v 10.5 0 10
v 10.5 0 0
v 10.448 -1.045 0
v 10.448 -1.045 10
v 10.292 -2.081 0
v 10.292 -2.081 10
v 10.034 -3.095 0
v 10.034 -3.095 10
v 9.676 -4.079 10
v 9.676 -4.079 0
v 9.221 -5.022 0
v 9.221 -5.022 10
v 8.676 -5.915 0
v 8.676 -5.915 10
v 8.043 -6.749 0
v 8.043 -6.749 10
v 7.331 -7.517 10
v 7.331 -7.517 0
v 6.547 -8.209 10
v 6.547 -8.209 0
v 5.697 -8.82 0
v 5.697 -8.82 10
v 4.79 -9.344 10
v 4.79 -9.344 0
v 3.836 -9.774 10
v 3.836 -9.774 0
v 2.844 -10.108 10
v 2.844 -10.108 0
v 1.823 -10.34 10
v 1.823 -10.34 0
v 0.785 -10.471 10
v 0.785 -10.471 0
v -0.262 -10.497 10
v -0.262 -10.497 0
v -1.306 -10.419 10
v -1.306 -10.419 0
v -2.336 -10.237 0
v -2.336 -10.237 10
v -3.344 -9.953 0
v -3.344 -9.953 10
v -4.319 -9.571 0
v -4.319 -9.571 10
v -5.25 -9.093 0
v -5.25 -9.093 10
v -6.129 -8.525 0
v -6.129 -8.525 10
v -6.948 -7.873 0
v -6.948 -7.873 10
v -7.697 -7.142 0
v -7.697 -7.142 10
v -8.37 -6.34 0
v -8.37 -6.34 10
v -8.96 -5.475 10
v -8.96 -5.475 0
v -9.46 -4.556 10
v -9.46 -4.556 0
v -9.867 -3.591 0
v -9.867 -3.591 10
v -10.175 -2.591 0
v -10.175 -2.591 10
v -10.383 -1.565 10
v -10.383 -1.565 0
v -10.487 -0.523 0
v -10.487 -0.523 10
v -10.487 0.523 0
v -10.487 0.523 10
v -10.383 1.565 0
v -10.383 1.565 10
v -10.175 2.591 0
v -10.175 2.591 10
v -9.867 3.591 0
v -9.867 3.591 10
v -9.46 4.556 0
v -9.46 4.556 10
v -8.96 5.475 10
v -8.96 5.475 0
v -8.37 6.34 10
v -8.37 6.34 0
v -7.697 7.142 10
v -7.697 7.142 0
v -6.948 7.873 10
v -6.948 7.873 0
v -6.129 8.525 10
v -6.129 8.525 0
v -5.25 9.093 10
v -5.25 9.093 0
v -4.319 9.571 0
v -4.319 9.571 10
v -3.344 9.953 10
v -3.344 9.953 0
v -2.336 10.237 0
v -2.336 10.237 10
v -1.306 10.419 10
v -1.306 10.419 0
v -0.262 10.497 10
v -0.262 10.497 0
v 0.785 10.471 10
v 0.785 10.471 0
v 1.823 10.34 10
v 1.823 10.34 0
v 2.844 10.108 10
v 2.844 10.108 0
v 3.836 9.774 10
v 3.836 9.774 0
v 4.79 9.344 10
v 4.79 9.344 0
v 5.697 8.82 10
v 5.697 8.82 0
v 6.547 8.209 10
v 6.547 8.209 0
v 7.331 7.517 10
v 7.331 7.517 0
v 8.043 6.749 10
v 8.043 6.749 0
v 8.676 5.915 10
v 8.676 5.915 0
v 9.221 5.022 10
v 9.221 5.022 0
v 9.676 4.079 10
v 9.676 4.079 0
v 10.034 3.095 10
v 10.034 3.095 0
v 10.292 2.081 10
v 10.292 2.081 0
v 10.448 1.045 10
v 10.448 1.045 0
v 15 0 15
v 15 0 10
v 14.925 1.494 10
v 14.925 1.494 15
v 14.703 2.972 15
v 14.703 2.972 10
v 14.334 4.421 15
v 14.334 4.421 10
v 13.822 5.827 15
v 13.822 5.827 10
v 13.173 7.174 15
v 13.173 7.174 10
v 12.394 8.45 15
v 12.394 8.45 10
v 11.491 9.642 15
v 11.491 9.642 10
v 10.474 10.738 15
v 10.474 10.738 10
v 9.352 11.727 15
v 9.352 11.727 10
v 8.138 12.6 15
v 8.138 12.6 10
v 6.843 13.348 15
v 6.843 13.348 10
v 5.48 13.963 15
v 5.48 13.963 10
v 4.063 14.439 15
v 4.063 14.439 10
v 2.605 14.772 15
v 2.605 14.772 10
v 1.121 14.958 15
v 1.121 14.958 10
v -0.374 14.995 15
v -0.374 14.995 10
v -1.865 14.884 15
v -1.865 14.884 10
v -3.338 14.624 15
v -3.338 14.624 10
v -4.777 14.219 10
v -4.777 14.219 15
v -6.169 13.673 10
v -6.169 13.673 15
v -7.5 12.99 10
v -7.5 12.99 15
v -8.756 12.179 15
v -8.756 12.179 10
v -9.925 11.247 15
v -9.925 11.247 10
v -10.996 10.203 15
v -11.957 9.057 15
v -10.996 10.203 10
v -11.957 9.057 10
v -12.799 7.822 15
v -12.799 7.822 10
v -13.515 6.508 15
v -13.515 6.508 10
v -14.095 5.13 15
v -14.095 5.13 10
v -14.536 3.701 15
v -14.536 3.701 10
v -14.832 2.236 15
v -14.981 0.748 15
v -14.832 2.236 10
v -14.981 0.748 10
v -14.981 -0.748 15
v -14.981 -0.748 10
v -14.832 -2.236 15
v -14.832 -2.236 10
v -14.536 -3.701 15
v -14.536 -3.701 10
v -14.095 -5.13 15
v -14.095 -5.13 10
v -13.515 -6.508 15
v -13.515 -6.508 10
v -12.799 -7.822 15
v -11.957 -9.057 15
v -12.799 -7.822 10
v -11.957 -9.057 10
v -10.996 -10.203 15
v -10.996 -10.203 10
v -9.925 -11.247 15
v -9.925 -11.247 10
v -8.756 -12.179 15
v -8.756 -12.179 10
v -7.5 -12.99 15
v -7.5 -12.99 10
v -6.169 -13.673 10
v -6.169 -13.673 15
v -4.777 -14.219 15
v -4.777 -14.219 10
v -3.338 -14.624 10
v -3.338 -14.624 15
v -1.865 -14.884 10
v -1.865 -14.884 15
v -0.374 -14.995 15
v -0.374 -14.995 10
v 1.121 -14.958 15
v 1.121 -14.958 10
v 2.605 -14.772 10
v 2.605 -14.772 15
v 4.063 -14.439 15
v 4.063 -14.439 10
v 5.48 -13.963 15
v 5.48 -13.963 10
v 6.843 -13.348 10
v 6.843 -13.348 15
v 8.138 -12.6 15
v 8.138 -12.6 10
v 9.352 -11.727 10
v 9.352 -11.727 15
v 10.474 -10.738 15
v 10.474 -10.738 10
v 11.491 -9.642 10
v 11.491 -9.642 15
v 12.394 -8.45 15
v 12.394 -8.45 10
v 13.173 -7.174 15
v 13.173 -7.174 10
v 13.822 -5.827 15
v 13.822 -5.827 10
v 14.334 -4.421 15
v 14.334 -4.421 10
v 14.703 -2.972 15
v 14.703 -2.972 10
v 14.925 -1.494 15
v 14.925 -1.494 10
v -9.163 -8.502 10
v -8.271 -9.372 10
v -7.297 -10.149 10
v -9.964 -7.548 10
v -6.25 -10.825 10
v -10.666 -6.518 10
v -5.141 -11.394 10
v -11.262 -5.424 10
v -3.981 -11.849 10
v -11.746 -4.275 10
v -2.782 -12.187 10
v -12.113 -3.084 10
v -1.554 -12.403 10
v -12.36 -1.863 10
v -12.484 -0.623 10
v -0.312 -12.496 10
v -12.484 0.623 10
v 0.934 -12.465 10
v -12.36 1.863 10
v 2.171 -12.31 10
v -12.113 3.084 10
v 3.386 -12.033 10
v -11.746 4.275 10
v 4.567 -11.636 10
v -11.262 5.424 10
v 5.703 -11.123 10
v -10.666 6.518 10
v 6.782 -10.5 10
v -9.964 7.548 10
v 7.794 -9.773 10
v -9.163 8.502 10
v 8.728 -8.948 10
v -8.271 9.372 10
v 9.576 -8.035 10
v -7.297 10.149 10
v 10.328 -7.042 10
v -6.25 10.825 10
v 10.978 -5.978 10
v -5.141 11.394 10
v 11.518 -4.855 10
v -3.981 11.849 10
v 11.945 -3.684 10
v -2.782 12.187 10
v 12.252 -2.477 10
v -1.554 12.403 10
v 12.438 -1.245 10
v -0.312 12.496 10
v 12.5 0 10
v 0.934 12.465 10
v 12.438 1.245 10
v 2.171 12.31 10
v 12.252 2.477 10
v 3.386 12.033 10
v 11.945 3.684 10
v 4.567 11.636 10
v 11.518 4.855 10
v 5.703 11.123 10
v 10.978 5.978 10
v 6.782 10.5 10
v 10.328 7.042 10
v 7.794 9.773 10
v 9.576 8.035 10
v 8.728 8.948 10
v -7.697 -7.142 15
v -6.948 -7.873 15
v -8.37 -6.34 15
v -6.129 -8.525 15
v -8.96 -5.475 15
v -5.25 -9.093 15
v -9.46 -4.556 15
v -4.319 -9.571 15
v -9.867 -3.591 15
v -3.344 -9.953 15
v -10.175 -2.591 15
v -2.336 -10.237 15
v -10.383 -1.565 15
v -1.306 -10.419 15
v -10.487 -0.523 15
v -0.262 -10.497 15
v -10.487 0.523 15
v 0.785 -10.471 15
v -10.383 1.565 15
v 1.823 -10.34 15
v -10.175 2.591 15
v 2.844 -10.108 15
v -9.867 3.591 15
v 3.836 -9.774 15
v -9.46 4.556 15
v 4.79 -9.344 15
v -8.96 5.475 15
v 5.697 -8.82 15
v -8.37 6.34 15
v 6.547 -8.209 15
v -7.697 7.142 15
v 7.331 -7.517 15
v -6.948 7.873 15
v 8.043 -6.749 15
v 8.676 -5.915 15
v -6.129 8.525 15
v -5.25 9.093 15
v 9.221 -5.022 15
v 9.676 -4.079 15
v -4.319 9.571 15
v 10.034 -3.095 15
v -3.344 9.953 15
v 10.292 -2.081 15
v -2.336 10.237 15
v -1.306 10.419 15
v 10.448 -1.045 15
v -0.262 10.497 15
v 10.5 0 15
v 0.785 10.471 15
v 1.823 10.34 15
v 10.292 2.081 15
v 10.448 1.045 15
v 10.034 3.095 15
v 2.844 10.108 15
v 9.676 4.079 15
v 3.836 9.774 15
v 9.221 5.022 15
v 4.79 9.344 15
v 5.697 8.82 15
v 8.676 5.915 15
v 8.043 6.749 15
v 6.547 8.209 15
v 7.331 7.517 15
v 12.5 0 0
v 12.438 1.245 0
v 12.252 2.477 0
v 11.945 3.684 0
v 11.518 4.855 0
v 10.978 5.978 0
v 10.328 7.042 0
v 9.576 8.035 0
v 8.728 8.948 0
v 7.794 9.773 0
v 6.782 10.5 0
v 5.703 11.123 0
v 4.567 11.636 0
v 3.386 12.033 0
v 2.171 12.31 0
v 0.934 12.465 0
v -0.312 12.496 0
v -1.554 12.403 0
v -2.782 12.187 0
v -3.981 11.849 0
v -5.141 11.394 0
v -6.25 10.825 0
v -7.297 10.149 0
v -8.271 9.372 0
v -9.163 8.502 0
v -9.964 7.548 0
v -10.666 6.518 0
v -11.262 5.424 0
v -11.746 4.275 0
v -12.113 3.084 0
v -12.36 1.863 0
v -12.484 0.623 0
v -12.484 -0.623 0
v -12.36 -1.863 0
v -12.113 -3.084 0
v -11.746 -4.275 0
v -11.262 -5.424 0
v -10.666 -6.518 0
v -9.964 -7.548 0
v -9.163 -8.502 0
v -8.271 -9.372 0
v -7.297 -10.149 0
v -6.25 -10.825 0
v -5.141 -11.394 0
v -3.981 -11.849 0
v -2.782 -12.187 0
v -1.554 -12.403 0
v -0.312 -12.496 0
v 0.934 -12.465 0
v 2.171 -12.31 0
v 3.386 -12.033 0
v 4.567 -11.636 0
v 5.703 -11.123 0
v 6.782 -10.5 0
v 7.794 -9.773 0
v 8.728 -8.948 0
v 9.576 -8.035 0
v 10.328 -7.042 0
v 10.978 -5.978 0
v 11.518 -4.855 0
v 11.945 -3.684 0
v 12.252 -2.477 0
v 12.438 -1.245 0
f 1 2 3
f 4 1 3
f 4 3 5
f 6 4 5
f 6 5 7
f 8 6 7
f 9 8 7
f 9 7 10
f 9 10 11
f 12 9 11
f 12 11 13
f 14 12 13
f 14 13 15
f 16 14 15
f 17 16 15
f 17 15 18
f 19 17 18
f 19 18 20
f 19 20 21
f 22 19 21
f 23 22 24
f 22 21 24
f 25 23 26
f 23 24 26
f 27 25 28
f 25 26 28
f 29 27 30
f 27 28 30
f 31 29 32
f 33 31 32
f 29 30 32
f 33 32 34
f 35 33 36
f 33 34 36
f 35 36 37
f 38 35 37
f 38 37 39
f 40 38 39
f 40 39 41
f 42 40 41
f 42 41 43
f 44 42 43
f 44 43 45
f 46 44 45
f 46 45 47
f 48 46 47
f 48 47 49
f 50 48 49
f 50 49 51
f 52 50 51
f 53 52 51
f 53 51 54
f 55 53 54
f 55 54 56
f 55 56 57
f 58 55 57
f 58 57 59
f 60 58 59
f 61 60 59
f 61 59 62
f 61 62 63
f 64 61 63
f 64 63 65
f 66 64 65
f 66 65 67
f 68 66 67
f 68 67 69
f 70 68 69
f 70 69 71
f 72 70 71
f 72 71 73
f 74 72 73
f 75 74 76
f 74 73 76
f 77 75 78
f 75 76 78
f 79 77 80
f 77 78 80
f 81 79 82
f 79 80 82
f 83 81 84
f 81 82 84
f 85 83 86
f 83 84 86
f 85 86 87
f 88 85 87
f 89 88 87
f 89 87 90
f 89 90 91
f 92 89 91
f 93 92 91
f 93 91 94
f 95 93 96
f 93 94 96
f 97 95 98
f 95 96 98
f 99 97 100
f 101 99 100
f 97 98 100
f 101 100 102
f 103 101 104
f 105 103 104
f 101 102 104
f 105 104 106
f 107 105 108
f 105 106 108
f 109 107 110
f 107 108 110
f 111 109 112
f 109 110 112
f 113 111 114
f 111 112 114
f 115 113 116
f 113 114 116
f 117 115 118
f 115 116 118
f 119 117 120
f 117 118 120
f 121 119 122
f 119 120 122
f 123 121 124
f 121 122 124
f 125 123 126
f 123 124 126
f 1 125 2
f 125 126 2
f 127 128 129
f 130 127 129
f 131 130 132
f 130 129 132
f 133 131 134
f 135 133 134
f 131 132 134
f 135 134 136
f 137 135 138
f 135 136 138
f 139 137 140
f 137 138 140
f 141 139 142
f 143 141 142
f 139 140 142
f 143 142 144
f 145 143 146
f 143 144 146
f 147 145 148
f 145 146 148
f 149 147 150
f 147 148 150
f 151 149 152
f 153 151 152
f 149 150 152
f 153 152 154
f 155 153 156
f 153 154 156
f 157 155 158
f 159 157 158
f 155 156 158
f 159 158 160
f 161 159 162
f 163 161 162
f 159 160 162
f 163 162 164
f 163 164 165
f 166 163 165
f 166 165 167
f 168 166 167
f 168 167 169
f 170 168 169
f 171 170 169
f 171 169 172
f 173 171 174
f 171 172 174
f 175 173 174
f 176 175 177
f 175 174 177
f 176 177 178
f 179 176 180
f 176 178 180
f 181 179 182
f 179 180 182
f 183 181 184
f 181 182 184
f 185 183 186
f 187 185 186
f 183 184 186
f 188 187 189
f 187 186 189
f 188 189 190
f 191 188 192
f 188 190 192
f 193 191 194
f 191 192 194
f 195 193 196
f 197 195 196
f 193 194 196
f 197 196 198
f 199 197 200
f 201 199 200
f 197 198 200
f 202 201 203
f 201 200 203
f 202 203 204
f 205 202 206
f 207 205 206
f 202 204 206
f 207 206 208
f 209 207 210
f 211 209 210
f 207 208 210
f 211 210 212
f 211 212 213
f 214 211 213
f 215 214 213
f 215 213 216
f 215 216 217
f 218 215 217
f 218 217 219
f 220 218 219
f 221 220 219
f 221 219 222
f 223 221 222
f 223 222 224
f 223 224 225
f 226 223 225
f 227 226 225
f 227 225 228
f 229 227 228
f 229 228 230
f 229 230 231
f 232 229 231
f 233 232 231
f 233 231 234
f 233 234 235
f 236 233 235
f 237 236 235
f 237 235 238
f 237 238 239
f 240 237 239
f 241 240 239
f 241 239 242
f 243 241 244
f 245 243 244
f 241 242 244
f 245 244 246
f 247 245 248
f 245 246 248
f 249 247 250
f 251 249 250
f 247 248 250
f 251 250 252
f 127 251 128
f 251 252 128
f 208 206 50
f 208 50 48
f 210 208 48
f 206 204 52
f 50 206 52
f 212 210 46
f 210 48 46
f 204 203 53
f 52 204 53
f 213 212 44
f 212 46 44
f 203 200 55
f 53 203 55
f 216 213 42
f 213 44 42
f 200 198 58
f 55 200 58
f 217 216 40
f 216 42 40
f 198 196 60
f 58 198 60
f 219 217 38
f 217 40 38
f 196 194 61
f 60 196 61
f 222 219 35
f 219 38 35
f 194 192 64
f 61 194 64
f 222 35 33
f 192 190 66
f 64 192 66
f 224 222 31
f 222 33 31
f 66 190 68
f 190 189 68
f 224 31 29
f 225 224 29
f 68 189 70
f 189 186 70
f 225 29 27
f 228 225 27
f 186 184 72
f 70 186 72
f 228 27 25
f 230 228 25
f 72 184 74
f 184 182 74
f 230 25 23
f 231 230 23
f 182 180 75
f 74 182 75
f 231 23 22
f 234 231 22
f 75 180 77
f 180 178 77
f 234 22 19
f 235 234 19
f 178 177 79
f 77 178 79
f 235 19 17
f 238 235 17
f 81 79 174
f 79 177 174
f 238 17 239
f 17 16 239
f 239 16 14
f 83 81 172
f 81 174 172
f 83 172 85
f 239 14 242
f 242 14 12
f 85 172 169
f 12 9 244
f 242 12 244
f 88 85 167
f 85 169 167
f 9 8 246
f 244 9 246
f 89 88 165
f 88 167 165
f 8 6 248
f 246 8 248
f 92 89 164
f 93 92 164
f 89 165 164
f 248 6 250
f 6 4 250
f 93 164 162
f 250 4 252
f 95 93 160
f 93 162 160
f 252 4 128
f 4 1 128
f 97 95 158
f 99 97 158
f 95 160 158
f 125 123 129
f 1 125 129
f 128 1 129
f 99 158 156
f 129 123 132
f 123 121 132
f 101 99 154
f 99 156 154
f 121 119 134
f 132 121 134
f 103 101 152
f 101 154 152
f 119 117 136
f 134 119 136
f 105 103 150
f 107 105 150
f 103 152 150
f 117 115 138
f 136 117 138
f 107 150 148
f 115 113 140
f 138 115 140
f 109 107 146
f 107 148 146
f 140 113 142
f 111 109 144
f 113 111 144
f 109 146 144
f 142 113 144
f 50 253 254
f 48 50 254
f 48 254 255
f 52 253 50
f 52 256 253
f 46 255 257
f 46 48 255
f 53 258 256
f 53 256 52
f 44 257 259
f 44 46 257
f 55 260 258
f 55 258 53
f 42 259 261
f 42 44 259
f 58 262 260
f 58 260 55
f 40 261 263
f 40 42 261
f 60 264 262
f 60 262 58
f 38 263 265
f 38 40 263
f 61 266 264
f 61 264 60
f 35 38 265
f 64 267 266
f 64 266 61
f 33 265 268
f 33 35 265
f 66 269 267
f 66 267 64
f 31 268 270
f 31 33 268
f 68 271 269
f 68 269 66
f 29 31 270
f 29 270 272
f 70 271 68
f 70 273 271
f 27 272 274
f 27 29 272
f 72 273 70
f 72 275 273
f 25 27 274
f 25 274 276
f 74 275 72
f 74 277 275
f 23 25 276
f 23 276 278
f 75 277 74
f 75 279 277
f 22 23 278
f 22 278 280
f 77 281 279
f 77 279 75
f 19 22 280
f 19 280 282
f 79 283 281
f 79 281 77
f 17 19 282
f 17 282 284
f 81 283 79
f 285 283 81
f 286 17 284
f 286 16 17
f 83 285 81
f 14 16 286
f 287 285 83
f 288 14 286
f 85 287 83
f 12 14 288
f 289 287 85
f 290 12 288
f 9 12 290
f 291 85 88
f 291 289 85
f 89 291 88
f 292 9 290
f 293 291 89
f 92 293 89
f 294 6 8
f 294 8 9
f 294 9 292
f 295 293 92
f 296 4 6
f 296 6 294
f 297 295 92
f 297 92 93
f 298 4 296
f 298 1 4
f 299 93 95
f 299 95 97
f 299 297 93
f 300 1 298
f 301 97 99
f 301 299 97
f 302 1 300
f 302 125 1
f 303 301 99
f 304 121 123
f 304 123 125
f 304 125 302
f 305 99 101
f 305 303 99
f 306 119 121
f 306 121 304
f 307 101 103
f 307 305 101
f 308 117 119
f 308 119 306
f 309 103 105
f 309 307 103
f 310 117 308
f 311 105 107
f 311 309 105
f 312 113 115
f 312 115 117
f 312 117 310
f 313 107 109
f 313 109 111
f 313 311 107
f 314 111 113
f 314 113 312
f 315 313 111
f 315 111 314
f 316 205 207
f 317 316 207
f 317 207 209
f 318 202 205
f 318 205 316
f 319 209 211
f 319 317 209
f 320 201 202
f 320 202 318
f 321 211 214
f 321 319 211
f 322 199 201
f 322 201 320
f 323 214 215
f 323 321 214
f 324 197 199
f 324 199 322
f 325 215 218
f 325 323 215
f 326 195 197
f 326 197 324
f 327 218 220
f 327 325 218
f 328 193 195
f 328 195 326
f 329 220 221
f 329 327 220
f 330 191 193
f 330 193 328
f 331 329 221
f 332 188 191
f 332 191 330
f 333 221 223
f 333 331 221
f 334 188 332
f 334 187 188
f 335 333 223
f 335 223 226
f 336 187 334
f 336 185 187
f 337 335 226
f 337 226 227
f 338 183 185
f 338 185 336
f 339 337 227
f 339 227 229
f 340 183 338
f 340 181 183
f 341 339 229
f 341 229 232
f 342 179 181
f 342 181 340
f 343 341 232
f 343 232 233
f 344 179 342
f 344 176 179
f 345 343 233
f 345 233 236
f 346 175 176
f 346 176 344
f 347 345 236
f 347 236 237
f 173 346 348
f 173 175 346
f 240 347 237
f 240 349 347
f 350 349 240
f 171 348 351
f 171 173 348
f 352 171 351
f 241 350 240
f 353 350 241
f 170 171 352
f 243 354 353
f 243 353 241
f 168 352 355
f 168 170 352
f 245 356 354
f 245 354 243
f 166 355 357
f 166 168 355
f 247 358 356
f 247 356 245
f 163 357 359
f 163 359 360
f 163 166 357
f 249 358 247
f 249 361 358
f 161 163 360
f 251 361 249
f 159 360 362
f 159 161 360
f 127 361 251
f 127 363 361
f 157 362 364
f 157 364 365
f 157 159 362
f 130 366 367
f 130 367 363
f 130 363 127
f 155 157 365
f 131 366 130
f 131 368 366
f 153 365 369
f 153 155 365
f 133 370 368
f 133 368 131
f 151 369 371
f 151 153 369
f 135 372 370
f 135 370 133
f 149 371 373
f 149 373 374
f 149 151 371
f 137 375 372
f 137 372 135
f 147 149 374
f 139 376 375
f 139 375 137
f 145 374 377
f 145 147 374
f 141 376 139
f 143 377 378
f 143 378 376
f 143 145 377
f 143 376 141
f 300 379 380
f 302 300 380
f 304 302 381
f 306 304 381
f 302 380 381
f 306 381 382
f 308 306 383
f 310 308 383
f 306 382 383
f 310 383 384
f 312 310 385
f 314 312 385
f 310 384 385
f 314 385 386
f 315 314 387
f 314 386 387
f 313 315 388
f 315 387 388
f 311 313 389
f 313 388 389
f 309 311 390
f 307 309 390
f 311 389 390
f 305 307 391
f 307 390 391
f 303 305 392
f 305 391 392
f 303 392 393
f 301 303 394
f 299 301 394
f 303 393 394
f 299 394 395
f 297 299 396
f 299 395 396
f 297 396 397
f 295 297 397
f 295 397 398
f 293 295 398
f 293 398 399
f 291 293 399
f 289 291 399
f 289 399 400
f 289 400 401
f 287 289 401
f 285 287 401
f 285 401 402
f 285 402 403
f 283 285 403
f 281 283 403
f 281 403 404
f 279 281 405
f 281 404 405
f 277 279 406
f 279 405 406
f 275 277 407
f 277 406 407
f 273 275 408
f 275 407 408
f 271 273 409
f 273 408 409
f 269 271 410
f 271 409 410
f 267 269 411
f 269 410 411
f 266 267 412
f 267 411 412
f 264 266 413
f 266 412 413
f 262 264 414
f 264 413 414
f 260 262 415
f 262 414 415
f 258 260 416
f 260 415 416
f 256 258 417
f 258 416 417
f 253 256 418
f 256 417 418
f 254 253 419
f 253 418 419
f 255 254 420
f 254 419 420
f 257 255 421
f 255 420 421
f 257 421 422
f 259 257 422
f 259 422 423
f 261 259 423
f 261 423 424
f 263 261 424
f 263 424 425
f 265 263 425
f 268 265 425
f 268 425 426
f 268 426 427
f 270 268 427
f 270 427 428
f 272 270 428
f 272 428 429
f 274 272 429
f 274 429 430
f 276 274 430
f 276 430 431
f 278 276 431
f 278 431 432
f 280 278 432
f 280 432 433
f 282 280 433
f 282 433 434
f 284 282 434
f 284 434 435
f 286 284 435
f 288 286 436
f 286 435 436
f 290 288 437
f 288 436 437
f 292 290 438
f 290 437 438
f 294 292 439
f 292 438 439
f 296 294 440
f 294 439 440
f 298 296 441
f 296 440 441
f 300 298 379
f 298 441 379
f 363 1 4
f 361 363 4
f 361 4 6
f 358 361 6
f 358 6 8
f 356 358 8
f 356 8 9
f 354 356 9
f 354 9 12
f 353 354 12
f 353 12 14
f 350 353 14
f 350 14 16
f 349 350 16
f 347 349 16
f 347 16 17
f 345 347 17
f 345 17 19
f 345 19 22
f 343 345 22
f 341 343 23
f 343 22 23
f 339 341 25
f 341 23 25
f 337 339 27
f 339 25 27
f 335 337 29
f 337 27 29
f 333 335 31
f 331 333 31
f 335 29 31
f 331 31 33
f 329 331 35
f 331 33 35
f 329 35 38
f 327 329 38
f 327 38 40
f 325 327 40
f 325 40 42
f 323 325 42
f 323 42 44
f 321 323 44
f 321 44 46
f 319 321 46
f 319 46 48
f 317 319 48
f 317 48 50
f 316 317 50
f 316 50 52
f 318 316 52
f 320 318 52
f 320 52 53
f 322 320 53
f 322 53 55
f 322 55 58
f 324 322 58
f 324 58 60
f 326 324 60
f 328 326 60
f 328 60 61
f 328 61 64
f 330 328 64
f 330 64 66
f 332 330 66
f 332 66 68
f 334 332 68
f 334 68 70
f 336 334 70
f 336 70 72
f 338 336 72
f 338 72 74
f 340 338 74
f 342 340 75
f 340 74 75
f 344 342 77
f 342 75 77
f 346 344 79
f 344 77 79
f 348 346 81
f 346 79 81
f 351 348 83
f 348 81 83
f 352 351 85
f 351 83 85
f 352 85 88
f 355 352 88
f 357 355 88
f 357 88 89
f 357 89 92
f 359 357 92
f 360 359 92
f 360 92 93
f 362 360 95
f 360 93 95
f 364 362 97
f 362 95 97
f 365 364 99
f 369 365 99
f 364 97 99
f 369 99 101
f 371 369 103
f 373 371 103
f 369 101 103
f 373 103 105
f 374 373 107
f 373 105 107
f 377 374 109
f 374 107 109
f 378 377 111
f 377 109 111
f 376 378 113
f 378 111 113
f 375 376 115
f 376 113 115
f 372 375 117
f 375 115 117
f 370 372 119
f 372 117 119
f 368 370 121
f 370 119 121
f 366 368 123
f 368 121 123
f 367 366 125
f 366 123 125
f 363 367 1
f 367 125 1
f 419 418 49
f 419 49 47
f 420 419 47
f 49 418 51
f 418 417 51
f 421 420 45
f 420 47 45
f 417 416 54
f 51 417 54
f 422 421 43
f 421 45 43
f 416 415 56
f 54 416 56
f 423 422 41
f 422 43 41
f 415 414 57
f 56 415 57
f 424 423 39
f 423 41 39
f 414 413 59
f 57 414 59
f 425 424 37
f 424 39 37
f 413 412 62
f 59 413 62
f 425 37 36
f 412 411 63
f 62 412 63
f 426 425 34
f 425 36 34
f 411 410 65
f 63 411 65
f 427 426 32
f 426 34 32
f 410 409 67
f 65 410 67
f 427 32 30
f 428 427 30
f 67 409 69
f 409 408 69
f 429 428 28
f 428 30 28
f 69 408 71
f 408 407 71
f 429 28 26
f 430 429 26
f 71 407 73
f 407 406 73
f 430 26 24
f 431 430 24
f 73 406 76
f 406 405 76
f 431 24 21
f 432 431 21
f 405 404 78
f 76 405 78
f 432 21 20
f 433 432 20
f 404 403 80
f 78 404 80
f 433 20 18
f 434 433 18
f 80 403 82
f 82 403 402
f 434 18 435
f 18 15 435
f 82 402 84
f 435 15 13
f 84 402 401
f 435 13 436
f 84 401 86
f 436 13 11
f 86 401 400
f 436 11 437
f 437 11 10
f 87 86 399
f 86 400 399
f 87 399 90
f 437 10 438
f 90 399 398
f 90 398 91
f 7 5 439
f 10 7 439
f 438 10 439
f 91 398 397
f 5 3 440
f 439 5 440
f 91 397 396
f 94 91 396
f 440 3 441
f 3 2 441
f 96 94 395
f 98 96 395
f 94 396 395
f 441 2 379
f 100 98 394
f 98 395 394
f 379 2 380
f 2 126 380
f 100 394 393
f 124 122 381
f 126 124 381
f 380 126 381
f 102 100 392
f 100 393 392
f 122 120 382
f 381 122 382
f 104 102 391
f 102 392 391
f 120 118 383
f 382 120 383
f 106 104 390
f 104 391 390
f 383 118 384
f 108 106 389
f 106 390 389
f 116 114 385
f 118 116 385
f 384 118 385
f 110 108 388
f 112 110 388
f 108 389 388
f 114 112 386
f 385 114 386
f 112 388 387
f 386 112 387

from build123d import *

# Parameters (mm, degrees)
F0_R     = 12.5
F1_DEPTH = 10
F2_R     = 15
F2_R_2   = 12.5
F3_DEPTH = 5
F4_R     = 10.5
F5_DEPTH = 50.6


with BuildPart() as f1:
    # F0 (on Top) → F1 (new body)
    with BuildSketch(Plane.XY):
        Circle(F0_R)
    extrude(amount=F1_DEPTH)


with BuildPart() as f3:
    # F2 (on face) → F3 (new body)
    with BuildSketch(Plane.XY.offset(10)):
        Circle(F2_R)
        Circle(F2_R_2, mode=Mode.SUBTRACT)
        Circle(F2_R_2)
    extrude(amount=F3_DEPTH)


with BuildPart() as f5_tool:
    # F4 (on face) → F5 (new body)
    with BuildSketch(Plane(origin=(0, 0, 0), x_dir=(1, 0, 0), z_dir=(0, 0, -1))):
        Circle(F4_R)
    extrude(amount=-F5_DEPTH)


with BuildPart() as f1_1:
    add(f1.part)

    # F5: cut by f5_tool
    add(f5_tool.part, mode=Mode.SUBTRACT)


with BuildPart() as f3_1:
    add(f3.part)

    # F5: cut by f5_tool
    add(f5_tool.part, mode=Mode.SUBTRACT)


solid = Compound([f1_1.part, f3_1.part])
